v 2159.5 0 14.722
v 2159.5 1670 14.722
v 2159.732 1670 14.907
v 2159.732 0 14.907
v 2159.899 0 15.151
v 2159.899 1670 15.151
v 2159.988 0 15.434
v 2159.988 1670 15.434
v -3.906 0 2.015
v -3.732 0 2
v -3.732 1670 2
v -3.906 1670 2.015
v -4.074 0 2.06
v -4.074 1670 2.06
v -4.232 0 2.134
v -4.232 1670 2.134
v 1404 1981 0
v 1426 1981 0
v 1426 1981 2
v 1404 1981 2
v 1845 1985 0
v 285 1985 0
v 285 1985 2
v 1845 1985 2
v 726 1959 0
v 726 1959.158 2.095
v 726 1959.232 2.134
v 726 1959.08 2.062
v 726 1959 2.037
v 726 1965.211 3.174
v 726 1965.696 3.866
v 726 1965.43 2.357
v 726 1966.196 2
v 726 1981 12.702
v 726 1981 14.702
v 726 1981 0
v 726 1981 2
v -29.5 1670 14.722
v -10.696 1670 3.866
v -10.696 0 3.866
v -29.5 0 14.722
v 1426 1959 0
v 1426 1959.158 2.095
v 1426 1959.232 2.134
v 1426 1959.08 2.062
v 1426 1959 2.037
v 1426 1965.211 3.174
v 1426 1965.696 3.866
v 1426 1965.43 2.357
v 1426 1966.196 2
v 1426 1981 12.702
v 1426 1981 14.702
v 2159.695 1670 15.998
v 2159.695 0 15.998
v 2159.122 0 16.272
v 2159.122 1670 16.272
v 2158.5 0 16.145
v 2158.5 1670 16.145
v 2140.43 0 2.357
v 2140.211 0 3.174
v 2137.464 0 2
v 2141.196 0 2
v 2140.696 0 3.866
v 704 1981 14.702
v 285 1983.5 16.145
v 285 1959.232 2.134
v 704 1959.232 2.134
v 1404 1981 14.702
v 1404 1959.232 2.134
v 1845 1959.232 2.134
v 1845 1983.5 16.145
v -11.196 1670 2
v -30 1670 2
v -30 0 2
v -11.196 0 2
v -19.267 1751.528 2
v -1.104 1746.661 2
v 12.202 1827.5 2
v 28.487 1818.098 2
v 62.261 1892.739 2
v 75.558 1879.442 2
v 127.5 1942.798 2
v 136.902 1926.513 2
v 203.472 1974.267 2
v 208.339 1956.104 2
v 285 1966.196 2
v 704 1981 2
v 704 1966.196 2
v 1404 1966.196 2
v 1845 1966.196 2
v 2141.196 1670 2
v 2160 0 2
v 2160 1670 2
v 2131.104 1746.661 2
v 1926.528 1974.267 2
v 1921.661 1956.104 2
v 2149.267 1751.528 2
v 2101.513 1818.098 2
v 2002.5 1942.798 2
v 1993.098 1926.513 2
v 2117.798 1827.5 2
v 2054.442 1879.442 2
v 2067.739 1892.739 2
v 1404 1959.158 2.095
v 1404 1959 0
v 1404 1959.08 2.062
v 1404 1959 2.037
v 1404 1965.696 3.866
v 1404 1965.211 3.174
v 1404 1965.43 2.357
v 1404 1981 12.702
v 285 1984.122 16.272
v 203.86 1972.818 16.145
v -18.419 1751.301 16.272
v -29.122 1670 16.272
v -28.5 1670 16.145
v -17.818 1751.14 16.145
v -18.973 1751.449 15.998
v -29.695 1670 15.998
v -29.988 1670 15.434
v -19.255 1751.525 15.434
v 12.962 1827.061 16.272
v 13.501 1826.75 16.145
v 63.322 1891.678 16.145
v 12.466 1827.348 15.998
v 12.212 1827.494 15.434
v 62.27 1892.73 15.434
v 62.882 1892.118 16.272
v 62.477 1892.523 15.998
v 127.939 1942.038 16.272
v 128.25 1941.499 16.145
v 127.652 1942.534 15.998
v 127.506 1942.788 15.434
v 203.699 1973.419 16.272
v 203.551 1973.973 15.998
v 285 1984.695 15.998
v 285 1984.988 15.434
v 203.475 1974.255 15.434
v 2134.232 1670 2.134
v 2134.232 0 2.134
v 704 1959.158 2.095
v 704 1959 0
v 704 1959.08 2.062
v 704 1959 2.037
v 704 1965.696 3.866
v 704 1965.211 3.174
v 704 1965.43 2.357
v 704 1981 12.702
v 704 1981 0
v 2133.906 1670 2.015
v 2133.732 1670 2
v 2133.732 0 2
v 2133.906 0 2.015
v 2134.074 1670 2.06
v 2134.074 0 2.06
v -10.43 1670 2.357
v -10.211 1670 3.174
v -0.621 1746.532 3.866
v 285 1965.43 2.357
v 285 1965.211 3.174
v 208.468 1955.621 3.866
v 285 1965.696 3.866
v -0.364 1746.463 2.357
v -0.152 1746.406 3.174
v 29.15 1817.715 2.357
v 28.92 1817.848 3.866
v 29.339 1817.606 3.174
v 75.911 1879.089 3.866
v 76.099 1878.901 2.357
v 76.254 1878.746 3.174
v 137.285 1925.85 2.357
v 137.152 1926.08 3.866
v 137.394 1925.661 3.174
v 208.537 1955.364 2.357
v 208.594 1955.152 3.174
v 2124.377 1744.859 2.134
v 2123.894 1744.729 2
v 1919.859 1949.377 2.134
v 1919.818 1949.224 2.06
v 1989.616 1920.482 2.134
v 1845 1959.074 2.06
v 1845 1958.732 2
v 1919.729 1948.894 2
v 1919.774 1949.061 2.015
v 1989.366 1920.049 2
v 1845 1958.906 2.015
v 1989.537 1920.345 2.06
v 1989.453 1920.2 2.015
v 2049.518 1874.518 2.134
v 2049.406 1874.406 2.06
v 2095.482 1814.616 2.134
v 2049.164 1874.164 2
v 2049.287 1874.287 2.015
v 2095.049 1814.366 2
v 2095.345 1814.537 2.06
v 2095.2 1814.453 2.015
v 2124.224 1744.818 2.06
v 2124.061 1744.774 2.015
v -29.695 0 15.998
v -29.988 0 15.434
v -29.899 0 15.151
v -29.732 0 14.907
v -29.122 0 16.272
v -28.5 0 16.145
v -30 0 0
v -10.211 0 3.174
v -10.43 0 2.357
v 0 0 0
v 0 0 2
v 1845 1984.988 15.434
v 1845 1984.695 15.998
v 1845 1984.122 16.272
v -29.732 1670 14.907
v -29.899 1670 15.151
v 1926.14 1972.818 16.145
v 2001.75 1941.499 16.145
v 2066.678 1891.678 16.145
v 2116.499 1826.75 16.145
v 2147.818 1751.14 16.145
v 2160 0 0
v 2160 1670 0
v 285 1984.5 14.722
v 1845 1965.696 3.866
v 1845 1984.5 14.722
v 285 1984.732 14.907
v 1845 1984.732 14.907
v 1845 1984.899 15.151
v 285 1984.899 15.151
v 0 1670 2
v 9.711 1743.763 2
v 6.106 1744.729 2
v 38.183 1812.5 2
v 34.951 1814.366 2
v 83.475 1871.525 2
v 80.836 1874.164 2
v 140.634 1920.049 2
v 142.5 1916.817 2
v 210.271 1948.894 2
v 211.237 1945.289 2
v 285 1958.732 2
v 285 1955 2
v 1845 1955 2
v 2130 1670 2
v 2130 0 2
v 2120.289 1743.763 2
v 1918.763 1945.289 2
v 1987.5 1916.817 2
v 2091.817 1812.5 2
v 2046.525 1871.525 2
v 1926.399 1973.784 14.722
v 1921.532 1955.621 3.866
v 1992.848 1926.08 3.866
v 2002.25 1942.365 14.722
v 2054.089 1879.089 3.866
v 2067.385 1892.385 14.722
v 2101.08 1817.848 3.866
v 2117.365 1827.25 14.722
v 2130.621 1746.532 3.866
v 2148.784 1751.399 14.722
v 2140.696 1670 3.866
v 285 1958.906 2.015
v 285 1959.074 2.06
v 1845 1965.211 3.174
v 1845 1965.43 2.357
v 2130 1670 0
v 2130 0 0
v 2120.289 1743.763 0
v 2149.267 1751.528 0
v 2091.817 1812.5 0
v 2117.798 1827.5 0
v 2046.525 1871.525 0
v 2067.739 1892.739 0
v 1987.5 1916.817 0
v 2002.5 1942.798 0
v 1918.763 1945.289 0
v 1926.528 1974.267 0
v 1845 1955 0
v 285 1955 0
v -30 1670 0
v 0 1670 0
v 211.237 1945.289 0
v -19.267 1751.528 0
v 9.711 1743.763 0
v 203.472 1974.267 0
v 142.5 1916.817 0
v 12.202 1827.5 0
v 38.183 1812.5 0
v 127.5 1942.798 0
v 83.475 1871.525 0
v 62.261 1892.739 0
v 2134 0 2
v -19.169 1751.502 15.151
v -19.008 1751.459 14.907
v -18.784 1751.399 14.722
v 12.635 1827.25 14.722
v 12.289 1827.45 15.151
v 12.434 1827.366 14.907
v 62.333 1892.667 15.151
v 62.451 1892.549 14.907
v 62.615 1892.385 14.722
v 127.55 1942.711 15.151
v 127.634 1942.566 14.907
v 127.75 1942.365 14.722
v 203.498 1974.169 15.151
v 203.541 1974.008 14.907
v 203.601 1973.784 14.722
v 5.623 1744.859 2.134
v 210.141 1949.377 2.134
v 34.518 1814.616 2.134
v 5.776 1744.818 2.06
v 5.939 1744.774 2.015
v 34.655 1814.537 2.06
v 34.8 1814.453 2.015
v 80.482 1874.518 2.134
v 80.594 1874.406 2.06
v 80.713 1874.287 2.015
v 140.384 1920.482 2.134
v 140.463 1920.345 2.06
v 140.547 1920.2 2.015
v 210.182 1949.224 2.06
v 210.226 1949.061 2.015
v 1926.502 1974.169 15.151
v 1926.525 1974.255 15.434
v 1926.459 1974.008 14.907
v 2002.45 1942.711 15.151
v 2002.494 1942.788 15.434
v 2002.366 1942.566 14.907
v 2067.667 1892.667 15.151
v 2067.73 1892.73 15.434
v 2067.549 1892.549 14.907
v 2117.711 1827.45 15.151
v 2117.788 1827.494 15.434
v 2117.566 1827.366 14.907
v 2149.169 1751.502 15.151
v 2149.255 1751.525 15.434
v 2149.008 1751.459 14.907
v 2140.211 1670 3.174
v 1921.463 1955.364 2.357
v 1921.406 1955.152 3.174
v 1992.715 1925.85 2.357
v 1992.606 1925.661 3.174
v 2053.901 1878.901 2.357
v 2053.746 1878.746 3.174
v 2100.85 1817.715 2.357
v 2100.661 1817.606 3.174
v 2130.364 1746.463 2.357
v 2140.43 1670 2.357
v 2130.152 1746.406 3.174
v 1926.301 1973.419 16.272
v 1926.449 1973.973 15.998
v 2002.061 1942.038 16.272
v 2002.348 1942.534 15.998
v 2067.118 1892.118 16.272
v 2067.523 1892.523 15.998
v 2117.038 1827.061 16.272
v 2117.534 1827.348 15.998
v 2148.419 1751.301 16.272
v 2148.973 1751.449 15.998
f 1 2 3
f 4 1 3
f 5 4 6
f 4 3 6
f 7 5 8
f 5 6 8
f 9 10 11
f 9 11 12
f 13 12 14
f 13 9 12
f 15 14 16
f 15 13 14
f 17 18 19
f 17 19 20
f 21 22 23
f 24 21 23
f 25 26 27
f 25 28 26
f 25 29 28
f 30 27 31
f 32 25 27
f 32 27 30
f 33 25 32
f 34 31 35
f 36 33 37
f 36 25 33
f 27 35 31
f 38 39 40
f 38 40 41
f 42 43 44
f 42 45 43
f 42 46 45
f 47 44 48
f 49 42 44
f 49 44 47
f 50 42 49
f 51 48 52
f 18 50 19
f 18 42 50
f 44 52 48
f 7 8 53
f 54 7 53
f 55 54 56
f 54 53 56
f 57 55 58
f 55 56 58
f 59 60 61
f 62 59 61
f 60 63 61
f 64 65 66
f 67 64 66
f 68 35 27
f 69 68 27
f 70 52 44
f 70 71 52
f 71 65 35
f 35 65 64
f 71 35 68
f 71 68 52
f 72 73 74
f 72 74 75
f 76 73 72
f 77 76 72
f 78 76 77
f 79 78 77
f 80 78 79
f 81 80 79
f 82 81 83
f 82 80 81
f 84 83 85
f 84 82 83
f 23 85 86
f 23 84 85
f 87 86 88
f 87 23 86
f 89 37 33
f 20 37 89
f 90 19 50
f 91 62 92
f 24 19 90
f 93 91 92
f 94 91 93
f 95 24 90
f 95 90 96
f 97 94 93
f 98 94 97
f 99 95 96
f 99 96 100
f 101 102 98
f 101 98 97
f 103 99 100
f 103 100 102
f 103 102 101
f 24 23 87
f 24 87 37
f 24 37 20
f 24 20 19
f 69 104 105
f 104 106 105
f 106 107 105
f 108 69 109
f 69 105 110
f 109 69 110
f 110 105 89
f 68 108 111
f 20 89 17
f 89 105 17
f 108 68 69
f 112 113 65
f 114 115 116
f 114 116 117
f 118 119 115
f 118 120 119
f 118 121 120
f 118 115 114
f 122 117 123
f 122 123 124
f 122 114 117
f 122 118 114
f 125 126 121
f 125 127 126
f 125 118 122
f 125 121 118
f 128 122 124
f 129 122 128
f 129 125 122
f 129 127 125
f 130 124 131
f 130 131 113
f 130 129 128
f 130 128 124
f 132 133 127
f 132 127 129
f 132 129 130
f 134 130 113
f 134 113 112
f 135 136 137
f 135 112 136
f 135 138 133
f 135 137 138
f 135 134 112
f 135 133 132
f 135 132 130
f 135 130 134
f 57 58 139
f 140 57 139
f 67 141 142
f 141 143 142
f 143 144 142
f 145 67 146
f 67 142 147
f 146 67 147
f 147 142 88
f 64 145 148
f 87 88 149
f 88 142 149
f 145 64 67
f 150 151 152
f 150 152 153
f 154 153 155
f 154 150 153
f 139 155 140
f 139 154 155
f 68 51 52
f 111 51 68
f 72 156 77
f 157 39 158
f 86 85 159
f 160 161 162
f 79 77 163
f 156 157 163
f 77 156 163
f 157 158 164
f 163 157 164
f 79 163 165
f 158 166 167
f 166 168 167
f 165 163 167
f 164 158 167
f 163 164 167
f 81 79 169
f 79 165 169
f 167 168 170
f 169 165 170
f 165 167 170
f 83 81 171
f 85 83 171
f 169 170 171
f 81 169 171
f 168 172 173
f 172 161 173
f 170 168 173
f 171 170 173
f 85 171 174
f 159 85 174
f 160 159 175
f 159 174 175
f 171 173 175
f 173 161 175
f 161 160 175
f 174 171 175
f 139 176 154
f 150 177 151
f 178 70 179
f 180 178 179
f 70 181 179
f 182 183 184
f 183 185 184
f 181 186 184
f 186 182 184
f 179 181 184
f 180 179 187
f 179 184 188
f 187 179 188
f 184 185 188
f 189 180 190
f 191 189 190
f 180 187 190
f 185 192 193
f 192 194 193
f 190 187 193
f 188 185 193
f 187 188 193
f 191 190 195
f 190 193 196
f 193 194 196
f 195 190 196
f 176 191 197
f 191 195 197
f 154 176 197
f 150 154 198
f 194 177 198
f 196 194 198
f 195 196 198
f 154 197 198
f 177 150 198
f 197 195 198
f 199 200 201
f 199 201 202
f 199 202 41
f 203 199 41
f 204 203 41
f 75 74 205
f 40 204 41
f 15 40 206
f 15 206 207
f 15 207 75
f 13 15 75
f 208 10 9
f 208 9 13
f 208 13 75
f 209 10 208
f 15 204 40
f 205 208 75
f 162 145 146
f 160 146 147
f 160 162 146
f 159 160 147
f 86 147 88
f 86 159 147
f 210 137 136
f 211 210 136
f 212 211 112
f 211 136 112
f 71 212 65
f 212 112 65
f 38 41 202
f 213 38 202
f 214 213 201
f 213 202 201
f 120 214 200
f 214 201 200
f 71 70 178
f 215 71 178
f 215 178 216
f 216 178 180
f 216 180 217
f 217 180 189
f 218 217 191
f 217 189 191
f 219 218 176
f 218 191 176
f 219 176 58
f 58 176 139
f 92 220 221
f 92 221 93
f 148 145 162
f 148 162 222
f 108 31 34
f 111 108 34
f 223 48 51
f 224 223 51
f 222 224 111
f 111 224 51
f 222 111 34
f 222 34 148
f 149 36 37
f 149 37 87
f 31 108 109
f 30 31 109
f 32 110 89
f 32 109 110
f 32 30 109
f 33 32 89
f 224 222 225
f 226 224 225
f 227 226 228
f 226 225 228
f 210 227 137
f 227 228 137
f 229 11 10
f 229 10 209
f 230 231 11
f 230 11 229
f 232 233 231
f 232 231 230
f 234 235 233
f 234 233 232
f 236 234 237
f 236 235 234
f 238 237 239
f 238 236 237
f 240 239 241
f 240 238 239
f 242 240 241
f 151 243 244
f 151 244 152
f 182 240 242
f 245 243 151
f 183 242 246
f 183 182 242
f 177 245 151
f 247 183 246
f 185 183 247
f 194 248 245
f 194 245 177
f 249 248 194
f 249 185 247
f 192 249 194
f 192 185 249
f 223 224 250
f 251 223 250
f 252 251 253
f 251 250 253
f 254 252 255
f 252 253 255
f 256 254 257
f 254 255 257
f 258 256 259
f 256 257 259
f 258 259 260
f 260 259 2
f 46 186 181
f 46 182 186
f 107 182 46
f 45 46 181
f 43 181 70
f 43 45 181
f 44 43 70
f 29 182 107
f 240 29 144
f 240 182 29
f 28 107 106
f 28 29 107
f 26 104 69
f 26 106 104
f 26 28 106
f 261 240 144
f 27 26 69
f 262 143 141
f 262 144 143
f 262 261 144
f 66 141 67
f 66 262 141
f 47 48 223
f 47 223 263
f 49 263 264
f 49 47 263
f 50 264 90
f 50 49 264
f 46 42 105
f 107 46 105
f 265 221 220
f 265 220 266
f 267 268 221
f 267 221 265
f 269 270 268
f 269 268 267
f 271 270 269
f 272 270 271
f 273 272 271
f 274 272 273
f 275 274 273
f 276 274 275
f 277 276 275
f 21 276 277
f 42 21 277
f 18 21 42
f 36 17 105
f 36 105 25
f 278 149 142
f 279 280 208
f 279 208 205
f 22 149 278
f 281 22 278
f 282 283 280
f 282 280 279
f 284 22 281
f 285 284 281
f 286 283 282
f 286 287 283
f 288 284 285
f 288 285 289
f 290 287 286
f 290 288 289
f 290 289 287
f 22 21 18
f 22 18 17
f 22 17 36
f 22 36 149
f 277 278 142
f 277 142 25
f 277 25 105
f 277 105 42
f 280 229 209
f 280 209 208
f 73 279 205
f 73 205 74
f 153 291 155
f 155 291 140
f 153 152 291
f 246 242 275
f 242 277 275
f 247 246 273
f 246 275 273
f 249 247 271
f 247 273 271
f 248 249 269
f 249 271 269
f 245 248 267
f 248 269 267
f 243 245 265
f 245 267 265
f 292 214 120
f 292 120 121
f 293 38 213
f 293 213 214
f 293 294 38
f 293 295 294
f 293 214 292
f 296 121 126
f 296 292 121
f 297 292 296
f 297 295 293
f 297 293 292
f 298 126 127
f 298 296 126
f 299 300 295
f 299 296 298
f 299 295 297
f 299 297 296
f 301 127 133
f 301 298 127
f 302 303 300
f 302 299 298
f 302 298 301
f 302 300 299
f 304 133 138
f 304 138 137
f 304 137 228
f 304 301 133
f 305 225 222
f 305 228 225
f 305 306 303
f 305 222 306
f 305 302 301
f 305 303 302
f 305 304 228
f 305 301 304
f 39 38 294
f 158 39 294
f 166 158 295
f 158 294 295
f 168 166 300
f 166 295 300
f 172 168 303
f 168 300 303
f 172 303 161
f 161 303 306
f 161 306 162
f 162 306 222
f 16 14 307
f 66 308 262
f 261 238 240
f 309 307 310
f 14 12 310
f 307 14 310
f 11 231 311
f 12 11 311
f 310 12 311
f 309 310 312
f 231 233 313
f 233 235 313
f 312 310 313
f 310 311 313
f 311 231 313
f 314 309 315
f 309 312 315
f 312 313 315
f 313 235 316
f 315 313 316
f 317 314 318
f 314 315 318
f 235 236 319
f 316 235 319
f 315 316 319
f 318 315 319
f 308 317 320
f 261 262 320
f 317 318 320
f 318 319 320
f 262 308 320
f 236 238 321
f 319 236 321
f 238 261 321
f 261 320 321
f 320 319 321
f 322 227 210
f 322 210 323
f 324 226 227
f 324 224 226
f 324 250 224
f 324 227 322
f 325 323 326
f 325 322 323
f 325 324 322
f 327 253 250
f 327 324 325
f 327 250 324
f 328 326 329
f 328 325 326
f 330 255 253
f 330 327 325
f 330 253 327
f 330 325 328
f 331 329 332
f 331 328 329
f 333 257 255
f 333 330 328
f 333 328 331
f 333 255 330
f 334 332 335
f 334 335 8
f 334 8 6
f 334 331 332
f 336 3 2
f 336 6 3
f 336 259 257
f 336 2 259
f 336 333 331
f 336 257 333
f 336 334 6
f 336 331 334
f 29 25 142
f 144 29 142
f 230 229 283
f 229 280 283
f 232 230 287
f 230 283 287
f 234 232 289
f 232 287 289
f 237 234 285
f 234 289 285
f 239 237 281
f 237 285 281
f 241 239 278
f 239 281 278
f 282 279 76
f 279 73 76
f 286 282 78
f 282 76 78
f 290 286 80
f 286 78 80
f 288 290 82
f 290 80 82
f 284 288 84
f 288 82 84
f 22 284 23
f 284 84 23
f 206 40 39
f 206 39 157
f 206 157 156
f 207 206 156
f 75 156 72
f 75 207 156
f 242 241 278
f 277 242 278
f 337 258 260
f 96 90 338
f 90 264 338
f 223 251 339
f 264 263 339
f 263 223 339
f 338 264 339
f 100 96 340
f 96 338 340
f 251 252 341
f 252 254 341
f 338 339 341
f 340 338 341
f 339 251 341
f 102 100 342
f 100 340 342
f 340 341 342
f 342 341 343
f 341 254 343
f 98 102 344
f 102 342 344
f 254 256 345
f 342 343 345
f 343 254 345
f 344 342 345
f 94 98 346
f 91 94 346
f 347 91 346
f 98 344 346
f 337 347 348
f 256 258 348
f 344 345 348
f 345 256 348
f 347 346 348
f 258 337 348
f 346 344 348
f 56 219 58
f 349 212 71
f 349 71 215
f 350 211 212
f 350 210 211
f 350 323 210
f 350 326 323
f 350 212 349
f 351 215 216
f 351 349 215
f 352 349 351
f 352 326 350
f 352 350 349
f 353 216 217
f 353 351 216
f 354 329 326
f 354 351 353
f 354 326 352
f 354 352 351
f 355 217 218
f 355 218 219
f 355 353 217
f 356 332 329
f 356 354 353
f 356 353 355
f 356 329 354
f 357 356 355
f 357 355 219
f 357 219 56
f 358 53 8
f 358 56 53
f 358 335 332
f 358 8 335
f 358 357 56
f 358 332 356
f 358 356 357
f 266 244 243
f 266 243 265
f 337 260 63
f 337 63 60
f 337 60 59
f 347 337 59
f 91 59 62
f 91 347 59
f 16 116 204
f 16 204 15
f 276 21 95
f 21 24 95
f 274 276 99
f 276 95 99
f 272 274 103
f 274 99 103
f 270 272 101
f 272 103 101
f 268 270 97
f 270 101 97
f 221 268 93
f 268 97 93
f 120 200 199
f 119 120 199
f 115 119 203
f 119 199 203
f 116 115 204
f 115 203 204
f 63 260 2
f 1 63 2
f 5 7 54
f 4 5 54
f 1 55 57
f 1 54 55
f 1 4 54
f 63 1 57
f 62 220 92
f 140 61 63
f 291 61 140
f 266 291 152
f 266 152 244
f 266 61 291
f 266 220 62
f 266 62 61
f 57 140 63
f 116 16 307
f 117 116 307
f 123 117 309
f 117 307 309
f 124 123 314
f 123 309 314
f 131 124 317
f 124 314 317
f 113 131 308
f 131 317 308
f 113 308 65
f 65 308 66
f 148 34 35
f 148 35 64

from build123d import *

# Parameters (mm, degrees)
FILLET1_R          = 1
SKETCH3_W          = 22
SKETCH3_H          = 22
CUT_EXTRUDE1_DEPTH = 2934.613813656


with BuildPart() as part:
    # Sweep1: sweep along a path in Sketch1
    with BuildLine(Plane.XY) as sweep1_path:
        Line((0, 0), (0, 1670))
        ThreePointArc((0, 1670), (83.474567362, 1871.525432638), (285, 1955))
        Line((285, 1955), (1845, 1955))
        ThreePointArc((1845, 1955), (2046.525432638, 1871.525432638), (2130, 1670))
        Line((2130, 1670), (2130, 0))
    # Sketch2 → Sweep1 (sweep)
    with BuildSketch(Plane(origin=(0, 0, 0), x_dir=(1, 0, 0), z_dir=(0, 1, 0))):
        Polygon((0, 0), (0, -2), (-4, -2), (-30, -17.011106999), (-30, -15.011106999), (-7.464101615, -2), (-30, -2), (-30, 0), align=None)
    sweep(path=sweep1_path.line)

    # Fillet1
    # the kernel refuses this fillet: 1 mm, written as the material it adds along each edge
    with BuildSketch(Plane(origin=(2134, 1670, 2), x_dir=(-1.0, -6.753186657693947e-15, -1.7725502571054264e-12), z_dir=(0, -1, 0))) as fillet1_piece_1:
        with BuildLine():
            CenterArc((FILLET1_R * 0.267949192429, -FILLET1_R), FILLET1_R, 90, 30)
            Line((-FILLET1_R * 0.232050807569, -FILLET1_R * 0.133974596215), (0, 0))
            Line((0, 0), (FILLET1_R * 0.267949192431, 0))
        make_face()
    extrude(amount=1670)
    with BuildSketch(Plane(origin=(1845, 1670, 2), x_dir=(0, 1, 0), z_dir=(-1, 0, 0))) as fillet1_piece_2:
        with BuildLine():
            CenterArc((289 - FILLET1_R * 0.267949192431, -FILLET1_R), FILLET1_R, 60, 30)
            Line((289 + FILLET1_R * 0.232050807569, -FILLET1_R * 0.133974596215), (289, 0))
            Line((289, 0), (289 - FILLET1_R * 0.267949192431, 0))
        make_face()
    revolve(axis=Axis((1845, 1670, 2), (0, 0, -1)), revolution_arc=90)
    with BuildSketch(Plane(origin=(285, 1959, 2), x_dir=(0, -1, 0), z_dir=(1, 0, 0))) as fillet1_piece_3:
        with BuildLine():
            CenterArc((FILLET1_R * 0.267949192431, -FILLET1_R), FILLET1_R, 90, 30)
            Line((-FILLET1_R * 0.232050807569, -FILLET1_R * 0.133974596215), (0, 0))
            Line((0, 0), (FILLET1_R * 0.267949192431, 0))
        make_face()
    extrude(amount=1560)
    with BuildSketch(Plane(origin=(285, 1670, 2), x_dir=(-1, 0, 0), z_dir=(0, -1, 0))) as fillet1_piece_4:
        with BuildLine():
            CenterArc((289 - FILLET1_R * 0.267949192431, -FILLET1_R), FILLET1_R, 60, 30)
            Line((289 + FILLET1_R * 0.232050807569, -FILLET1_R * 0.133974596216), (289, 0))
            Line((289, 0), (289 - FILLET1_R * 0.267949192431, 0))
        make_face()
    revolve(axis=Axis((285, 1670, 2), (0, 0, -1)), revolution_arc=90)
    with BuildSketch(Plane(origin=(2137.464101615, 1670, 2), x_dir=(1, 0, 0), z_dir=(0, -1, 0)), Plane(origin=(-7.464101615, 0, 2), x_dir=(-1, 0, 0), z_dir=(0, 1, 0))) as fillet1_piece_5:
        with BuildLine():
            CenterArc((FILLET1_R * 3.73205080757, FILLET1_R), FILLET1_R, 120, 150)
            Line((FILLET1_R * 3.23205080757, FILLET1_R * 1.86602540378), (0, 0))
            Line((0, 0), (FILLET1_R * 3.73205080757, 0))
        make_face()
    extrude(amount=1670)
    with BuildSketch(Plane(origin=(1845, 1670, 2), x_dir=(0, 1, 0), z_dir=(-1, 0, 0))) as fillet1_piece_6:
        with BuildLine():
            CenterArc((292.464101615 + FILLET1_R * 3.73205080757, -FILLET1_R), FILLET1_R, 90, 150)
            Line((292.464101615 + FILLET1_R * 3.23205080757, -FILLET1_R * 1.86602540378), (292.464101615, 0))
            Line((292.464101615, 0), (292.464101615 + FILLET1_R * 3.73205080757, 0))
        make_face()
    revolve(axis=Axis((1845, 1670, 2), (0, 0, -1)), revolution_arc=90)
    with BuildSketch(Plane(origin=(285, 1962.464101615, 2), x_dir=(0, 1, 0), z_dir=(1, 0, 0))) as fillet1_piece_7:
        with BuildLine():
            CenterArc((FILLET1_R * 3.73205080757, FILLET1_R), FILLET1_R, 120, 150)
            Line((FILLET1_R * 3.23205080757, FILLET1_R * 1.86602540378), (0, 0))
            Line((0, 0), (FILLET1_R * 3.73205080757, 0))
        make_face()
    extrude(amount=1560)
    with BuildSketch(Plane(origin=(285, 1670, 2), x_dir=(-1, 0, 0), z_dir=(0, -1, 0))) as fillet1_piece_8:
        with BuildLine():
            CenterArc((292.464101615 + FILLET1_R * 3.73205080757, -FILLET1_R), FILLET1_R, 90, 150)
            Line((292.464101615 + FILLET1_R * 3.23205080757, -FILLET1_R * 1.86602540378), (292.464101615, 0))
            Line((292.464101615, 0), (292.464101615 + FILLET1_R * 3.73205080757, 0))
        make_face()
    revolve(axis=Axis((285, 1670, 2), (0, 0, -1)), revolution_arc=90)
    with BuildSketch(Plane(origin=(-4, 0, 2), x_dir=(-0.8660254037844416, 0, 0.499999999999995), z_dir=(0, 1, 0))) as fillet1_piece_9:
        with BuildLine():
            CenterArc((FILLET1_R * 0.267949192431, FILLET1_R), FILLET1_R, 240, 30)
            Line((-FILLET1_R * 0.232050807569, FILLET1_R * 0.133974596216), (0, 0))
            Line((0, 0), (FILLET1_R * 0.267949192431, 0))
        make_face()
    extrude(amount=1670)
    # the kernel refuses this fillet: 1 mm, written as the material it takes off along each edge
    with BuildSketch(Plane(origin=(2160, 1670, 15.011106999), x_dir=(-0.8660254037844758, -7.797908269406777e-15, -0.49999999999993566), z_dir=(0, -1, 0)), Plane(origin=(-30, -1.443375673, 15.011106999), x_dir=(0.8660254037844414, 0, -0.4999999999999953), z_dir=(0, 1, 0))) as fillet1_2_piece_1:
        with BuildLine():
            CenterArc((FILLET1_R * 0.57735026919, -FILLET1_R), FILLET1_R, 90, 60)
            Line((-FILLET1_R * 0.288675134595, -FILLET1_R * 0.5), (0, 0))
            Line((0, 0), (FILLET1_R * 0.57735026919, 0))
        make_face()
    extrude(amount=1671.443375673, mode=Mode.SUBTRACT)
    with BuildSketch(Plane(origin=(1845, 1670, 15.011106999), x_dir=(0, 1, 0), z_dir=(-1, 0, 0))) as fillet1_2_piece_2:
        with BuildLine():
            CenterArc((315 - FILLET1_R, -FILLET1_R * 0.57735026919), FILLET1_R, 0, 60)
            Line((315 - FILLET1_R * 0.5, FILLET1_R * 0.288675134595), (315, 0))
            Line((315, 0), (315, -FILLET1_R * 0.57735026919))
        make_face()
    revolve(axis=Axis((1845, 1670, 15.011106999), (0, 0, -1)), revolution_arc=90, mode=Mode.SUBTRACT)
    with BuildSketch(Plane(origin=(285, 1985, 15.011106999), x_dir=(0, 0, 1), z_dir=(1, 0, 0))) as fillet1_2_piece_3:
        with BuildLine():
            CenterArc((FILLET1_R * 0.57735026919, FILLET1_R), FILLET1_R, 210, 60)
            Line((-FILLET1_R * 0.288675134595, FILLET1_R * 0.5), (0, 0))
            Line((0, 0), (FILLET1_R * 0.57735026919, 0))
        make_face()
    extrude(amount=1560, mode=Mode.SUBTRACT)
    with BuildSketch(Plane(origin=(285, 1670, 15.011106999), x_dir=(-1, 0, 0), z_dir=(0, -1, 0))) as fillet1_2_piece_4:
        with BuildLine():
            CenterArc((315 - FILLET1_R, -FILLET1_R * 0.57735026919), FILLET1_R, 0, 60)
            Line((315, -FILLET1_R * 0.57735026919), (315, 0))
            Line((315, 0), (315 - FILLET1_R * 0.5, FILLET1_R * 0.288675134595))
        make_face()
    revolve(axis=Axis((285, 1670, 15.011106999), (0, 0, -1)), revolution_arc=90, mode=Mode.SUBTRACT)
    with BuildSketch(Plane(origin=(2160, 1670, 17.011106999), x_dir=(-0.8660254037844523, 0, -0.4999999999999764), z_dir=(0, -1, 0))) as fillet1_2_piece_5:
        with BuildLine():
            CenterArc((FILLET1_R * 1.73205080757, FILLET1_R), FILLET1_R, 150, 120)
            Line((FILLET1_R * 0.866025403784, FILLET1_R * 1.5), (0, 0))
            Line((0, 0), (FILLET1_R * 1.73205080757, 0))
        make_face()
    extrude(amount=1674.330127019, mode=Mode.SUBTRACT)
    with BuildSketch(Plane(origin=(1845, 1670, 17.011106999), x_dir=(0, 1, 0), z_dir=(-1, 0, 0))) as fillet1_2_piece_6:
        with BuildLine():
            CenterArc((315 - FILLET1_R, FILLET1_R * 1.73205080757), FILLET1_R, 240, 120)
            Line((315, FILLET1_R * 1.73205080757), (315, 0))
            Line((315, 0), (315 - FILLET1_R * 1.5, FILLET1_R * 0.866025403784))
        make_face()
    revolve(axis=Axis((1845, 1670, 17.011106999), (0, 0, -1)), revolution_arc=90, mode=Mode.SUBTRACT)
    with BuildSketch(Plane(origin=(285, 1985, 17.011106999), x_dir=(0, -0.8660254037844523, -0.4999999999999764), z_dir=(1, 0, 0))) as fillet1_2_piece_7:
        with BuildLine():
            CenterArc((FILLET1_R * 1.73205080757, FILLET1_R), FILLET1_R, 150, 120)
            Line((FILLET1_R * 0.866025403784, FILLET1_R * 1.5), (0, 0))
            Line((0, 0), (FILLET1_R * 1.73205080757, 0))
        make_face()
    extrude(amount=1560, mode=Mode.SUBTRACT)
    with BuildSketch(Plane(origin=(285, 1670, 17.011106999), x_dir=(-1, 0, 0), z_dir=(0, -1, 0))) as fillet1_2_piece_8:
        with BuildLine():
            CenterArc((315 - FILLET1_R, FILLET1_R * 1.73205080757), FILLET1_R, 240, 120)
            Line((315, FILLET1_R * 1.73205080757), (315, 0))
            Line((315, 0), (315 - FILLET1_R * 1.5, FILLET1_R * 0.866025403784))
        make_face()
    revolve(axis=Axis((285, 1670, 17.011106999), (0, 0, -1)), revolution_arc=90, mode=Mode.SUBTRACT)
    with BuildSketch(Plane(origin=(-30, -4.330127019, 17.011106999), x_dir=(0, 0, -1), z_dir=(0, 1, 0))) as fillet1_2_piece_9:
        with BuildLine():
            CenterArc((FILLET1_R * 1.73205080757, -FILLET1_R), FILLET1_R, 90, 120)
            Line((FILLET1_R * 0.866025403784, -FILLET1_R * 1.5), (0, 0))
            Line((0, 0), (FILLET1_R * 1.73205080757, 0))
        make_face()
    extrude(amount=1674.330127019, mode=Mode.SUBTRACT)

    # Sketch3 → Cut-Extrude1 (cut, through all)
    with BuildSketch(Plane(origin=(0, 0, 0), x_dir=(-1, 0, 0), z_dir=(0, 0, -1))):
        with Locations((-1415, 1970)):
            Rectangle(SKETCH3_W, SKETCH3_H)
        with Locations((-715, 1970)):
            Rectangle(SKETCH3_W, SKETCH3_H)
    extrude(amount=-CUT_EXTRUDE1_DEPTH, mode=Mode.SUBTRACT)


solid = part.part
